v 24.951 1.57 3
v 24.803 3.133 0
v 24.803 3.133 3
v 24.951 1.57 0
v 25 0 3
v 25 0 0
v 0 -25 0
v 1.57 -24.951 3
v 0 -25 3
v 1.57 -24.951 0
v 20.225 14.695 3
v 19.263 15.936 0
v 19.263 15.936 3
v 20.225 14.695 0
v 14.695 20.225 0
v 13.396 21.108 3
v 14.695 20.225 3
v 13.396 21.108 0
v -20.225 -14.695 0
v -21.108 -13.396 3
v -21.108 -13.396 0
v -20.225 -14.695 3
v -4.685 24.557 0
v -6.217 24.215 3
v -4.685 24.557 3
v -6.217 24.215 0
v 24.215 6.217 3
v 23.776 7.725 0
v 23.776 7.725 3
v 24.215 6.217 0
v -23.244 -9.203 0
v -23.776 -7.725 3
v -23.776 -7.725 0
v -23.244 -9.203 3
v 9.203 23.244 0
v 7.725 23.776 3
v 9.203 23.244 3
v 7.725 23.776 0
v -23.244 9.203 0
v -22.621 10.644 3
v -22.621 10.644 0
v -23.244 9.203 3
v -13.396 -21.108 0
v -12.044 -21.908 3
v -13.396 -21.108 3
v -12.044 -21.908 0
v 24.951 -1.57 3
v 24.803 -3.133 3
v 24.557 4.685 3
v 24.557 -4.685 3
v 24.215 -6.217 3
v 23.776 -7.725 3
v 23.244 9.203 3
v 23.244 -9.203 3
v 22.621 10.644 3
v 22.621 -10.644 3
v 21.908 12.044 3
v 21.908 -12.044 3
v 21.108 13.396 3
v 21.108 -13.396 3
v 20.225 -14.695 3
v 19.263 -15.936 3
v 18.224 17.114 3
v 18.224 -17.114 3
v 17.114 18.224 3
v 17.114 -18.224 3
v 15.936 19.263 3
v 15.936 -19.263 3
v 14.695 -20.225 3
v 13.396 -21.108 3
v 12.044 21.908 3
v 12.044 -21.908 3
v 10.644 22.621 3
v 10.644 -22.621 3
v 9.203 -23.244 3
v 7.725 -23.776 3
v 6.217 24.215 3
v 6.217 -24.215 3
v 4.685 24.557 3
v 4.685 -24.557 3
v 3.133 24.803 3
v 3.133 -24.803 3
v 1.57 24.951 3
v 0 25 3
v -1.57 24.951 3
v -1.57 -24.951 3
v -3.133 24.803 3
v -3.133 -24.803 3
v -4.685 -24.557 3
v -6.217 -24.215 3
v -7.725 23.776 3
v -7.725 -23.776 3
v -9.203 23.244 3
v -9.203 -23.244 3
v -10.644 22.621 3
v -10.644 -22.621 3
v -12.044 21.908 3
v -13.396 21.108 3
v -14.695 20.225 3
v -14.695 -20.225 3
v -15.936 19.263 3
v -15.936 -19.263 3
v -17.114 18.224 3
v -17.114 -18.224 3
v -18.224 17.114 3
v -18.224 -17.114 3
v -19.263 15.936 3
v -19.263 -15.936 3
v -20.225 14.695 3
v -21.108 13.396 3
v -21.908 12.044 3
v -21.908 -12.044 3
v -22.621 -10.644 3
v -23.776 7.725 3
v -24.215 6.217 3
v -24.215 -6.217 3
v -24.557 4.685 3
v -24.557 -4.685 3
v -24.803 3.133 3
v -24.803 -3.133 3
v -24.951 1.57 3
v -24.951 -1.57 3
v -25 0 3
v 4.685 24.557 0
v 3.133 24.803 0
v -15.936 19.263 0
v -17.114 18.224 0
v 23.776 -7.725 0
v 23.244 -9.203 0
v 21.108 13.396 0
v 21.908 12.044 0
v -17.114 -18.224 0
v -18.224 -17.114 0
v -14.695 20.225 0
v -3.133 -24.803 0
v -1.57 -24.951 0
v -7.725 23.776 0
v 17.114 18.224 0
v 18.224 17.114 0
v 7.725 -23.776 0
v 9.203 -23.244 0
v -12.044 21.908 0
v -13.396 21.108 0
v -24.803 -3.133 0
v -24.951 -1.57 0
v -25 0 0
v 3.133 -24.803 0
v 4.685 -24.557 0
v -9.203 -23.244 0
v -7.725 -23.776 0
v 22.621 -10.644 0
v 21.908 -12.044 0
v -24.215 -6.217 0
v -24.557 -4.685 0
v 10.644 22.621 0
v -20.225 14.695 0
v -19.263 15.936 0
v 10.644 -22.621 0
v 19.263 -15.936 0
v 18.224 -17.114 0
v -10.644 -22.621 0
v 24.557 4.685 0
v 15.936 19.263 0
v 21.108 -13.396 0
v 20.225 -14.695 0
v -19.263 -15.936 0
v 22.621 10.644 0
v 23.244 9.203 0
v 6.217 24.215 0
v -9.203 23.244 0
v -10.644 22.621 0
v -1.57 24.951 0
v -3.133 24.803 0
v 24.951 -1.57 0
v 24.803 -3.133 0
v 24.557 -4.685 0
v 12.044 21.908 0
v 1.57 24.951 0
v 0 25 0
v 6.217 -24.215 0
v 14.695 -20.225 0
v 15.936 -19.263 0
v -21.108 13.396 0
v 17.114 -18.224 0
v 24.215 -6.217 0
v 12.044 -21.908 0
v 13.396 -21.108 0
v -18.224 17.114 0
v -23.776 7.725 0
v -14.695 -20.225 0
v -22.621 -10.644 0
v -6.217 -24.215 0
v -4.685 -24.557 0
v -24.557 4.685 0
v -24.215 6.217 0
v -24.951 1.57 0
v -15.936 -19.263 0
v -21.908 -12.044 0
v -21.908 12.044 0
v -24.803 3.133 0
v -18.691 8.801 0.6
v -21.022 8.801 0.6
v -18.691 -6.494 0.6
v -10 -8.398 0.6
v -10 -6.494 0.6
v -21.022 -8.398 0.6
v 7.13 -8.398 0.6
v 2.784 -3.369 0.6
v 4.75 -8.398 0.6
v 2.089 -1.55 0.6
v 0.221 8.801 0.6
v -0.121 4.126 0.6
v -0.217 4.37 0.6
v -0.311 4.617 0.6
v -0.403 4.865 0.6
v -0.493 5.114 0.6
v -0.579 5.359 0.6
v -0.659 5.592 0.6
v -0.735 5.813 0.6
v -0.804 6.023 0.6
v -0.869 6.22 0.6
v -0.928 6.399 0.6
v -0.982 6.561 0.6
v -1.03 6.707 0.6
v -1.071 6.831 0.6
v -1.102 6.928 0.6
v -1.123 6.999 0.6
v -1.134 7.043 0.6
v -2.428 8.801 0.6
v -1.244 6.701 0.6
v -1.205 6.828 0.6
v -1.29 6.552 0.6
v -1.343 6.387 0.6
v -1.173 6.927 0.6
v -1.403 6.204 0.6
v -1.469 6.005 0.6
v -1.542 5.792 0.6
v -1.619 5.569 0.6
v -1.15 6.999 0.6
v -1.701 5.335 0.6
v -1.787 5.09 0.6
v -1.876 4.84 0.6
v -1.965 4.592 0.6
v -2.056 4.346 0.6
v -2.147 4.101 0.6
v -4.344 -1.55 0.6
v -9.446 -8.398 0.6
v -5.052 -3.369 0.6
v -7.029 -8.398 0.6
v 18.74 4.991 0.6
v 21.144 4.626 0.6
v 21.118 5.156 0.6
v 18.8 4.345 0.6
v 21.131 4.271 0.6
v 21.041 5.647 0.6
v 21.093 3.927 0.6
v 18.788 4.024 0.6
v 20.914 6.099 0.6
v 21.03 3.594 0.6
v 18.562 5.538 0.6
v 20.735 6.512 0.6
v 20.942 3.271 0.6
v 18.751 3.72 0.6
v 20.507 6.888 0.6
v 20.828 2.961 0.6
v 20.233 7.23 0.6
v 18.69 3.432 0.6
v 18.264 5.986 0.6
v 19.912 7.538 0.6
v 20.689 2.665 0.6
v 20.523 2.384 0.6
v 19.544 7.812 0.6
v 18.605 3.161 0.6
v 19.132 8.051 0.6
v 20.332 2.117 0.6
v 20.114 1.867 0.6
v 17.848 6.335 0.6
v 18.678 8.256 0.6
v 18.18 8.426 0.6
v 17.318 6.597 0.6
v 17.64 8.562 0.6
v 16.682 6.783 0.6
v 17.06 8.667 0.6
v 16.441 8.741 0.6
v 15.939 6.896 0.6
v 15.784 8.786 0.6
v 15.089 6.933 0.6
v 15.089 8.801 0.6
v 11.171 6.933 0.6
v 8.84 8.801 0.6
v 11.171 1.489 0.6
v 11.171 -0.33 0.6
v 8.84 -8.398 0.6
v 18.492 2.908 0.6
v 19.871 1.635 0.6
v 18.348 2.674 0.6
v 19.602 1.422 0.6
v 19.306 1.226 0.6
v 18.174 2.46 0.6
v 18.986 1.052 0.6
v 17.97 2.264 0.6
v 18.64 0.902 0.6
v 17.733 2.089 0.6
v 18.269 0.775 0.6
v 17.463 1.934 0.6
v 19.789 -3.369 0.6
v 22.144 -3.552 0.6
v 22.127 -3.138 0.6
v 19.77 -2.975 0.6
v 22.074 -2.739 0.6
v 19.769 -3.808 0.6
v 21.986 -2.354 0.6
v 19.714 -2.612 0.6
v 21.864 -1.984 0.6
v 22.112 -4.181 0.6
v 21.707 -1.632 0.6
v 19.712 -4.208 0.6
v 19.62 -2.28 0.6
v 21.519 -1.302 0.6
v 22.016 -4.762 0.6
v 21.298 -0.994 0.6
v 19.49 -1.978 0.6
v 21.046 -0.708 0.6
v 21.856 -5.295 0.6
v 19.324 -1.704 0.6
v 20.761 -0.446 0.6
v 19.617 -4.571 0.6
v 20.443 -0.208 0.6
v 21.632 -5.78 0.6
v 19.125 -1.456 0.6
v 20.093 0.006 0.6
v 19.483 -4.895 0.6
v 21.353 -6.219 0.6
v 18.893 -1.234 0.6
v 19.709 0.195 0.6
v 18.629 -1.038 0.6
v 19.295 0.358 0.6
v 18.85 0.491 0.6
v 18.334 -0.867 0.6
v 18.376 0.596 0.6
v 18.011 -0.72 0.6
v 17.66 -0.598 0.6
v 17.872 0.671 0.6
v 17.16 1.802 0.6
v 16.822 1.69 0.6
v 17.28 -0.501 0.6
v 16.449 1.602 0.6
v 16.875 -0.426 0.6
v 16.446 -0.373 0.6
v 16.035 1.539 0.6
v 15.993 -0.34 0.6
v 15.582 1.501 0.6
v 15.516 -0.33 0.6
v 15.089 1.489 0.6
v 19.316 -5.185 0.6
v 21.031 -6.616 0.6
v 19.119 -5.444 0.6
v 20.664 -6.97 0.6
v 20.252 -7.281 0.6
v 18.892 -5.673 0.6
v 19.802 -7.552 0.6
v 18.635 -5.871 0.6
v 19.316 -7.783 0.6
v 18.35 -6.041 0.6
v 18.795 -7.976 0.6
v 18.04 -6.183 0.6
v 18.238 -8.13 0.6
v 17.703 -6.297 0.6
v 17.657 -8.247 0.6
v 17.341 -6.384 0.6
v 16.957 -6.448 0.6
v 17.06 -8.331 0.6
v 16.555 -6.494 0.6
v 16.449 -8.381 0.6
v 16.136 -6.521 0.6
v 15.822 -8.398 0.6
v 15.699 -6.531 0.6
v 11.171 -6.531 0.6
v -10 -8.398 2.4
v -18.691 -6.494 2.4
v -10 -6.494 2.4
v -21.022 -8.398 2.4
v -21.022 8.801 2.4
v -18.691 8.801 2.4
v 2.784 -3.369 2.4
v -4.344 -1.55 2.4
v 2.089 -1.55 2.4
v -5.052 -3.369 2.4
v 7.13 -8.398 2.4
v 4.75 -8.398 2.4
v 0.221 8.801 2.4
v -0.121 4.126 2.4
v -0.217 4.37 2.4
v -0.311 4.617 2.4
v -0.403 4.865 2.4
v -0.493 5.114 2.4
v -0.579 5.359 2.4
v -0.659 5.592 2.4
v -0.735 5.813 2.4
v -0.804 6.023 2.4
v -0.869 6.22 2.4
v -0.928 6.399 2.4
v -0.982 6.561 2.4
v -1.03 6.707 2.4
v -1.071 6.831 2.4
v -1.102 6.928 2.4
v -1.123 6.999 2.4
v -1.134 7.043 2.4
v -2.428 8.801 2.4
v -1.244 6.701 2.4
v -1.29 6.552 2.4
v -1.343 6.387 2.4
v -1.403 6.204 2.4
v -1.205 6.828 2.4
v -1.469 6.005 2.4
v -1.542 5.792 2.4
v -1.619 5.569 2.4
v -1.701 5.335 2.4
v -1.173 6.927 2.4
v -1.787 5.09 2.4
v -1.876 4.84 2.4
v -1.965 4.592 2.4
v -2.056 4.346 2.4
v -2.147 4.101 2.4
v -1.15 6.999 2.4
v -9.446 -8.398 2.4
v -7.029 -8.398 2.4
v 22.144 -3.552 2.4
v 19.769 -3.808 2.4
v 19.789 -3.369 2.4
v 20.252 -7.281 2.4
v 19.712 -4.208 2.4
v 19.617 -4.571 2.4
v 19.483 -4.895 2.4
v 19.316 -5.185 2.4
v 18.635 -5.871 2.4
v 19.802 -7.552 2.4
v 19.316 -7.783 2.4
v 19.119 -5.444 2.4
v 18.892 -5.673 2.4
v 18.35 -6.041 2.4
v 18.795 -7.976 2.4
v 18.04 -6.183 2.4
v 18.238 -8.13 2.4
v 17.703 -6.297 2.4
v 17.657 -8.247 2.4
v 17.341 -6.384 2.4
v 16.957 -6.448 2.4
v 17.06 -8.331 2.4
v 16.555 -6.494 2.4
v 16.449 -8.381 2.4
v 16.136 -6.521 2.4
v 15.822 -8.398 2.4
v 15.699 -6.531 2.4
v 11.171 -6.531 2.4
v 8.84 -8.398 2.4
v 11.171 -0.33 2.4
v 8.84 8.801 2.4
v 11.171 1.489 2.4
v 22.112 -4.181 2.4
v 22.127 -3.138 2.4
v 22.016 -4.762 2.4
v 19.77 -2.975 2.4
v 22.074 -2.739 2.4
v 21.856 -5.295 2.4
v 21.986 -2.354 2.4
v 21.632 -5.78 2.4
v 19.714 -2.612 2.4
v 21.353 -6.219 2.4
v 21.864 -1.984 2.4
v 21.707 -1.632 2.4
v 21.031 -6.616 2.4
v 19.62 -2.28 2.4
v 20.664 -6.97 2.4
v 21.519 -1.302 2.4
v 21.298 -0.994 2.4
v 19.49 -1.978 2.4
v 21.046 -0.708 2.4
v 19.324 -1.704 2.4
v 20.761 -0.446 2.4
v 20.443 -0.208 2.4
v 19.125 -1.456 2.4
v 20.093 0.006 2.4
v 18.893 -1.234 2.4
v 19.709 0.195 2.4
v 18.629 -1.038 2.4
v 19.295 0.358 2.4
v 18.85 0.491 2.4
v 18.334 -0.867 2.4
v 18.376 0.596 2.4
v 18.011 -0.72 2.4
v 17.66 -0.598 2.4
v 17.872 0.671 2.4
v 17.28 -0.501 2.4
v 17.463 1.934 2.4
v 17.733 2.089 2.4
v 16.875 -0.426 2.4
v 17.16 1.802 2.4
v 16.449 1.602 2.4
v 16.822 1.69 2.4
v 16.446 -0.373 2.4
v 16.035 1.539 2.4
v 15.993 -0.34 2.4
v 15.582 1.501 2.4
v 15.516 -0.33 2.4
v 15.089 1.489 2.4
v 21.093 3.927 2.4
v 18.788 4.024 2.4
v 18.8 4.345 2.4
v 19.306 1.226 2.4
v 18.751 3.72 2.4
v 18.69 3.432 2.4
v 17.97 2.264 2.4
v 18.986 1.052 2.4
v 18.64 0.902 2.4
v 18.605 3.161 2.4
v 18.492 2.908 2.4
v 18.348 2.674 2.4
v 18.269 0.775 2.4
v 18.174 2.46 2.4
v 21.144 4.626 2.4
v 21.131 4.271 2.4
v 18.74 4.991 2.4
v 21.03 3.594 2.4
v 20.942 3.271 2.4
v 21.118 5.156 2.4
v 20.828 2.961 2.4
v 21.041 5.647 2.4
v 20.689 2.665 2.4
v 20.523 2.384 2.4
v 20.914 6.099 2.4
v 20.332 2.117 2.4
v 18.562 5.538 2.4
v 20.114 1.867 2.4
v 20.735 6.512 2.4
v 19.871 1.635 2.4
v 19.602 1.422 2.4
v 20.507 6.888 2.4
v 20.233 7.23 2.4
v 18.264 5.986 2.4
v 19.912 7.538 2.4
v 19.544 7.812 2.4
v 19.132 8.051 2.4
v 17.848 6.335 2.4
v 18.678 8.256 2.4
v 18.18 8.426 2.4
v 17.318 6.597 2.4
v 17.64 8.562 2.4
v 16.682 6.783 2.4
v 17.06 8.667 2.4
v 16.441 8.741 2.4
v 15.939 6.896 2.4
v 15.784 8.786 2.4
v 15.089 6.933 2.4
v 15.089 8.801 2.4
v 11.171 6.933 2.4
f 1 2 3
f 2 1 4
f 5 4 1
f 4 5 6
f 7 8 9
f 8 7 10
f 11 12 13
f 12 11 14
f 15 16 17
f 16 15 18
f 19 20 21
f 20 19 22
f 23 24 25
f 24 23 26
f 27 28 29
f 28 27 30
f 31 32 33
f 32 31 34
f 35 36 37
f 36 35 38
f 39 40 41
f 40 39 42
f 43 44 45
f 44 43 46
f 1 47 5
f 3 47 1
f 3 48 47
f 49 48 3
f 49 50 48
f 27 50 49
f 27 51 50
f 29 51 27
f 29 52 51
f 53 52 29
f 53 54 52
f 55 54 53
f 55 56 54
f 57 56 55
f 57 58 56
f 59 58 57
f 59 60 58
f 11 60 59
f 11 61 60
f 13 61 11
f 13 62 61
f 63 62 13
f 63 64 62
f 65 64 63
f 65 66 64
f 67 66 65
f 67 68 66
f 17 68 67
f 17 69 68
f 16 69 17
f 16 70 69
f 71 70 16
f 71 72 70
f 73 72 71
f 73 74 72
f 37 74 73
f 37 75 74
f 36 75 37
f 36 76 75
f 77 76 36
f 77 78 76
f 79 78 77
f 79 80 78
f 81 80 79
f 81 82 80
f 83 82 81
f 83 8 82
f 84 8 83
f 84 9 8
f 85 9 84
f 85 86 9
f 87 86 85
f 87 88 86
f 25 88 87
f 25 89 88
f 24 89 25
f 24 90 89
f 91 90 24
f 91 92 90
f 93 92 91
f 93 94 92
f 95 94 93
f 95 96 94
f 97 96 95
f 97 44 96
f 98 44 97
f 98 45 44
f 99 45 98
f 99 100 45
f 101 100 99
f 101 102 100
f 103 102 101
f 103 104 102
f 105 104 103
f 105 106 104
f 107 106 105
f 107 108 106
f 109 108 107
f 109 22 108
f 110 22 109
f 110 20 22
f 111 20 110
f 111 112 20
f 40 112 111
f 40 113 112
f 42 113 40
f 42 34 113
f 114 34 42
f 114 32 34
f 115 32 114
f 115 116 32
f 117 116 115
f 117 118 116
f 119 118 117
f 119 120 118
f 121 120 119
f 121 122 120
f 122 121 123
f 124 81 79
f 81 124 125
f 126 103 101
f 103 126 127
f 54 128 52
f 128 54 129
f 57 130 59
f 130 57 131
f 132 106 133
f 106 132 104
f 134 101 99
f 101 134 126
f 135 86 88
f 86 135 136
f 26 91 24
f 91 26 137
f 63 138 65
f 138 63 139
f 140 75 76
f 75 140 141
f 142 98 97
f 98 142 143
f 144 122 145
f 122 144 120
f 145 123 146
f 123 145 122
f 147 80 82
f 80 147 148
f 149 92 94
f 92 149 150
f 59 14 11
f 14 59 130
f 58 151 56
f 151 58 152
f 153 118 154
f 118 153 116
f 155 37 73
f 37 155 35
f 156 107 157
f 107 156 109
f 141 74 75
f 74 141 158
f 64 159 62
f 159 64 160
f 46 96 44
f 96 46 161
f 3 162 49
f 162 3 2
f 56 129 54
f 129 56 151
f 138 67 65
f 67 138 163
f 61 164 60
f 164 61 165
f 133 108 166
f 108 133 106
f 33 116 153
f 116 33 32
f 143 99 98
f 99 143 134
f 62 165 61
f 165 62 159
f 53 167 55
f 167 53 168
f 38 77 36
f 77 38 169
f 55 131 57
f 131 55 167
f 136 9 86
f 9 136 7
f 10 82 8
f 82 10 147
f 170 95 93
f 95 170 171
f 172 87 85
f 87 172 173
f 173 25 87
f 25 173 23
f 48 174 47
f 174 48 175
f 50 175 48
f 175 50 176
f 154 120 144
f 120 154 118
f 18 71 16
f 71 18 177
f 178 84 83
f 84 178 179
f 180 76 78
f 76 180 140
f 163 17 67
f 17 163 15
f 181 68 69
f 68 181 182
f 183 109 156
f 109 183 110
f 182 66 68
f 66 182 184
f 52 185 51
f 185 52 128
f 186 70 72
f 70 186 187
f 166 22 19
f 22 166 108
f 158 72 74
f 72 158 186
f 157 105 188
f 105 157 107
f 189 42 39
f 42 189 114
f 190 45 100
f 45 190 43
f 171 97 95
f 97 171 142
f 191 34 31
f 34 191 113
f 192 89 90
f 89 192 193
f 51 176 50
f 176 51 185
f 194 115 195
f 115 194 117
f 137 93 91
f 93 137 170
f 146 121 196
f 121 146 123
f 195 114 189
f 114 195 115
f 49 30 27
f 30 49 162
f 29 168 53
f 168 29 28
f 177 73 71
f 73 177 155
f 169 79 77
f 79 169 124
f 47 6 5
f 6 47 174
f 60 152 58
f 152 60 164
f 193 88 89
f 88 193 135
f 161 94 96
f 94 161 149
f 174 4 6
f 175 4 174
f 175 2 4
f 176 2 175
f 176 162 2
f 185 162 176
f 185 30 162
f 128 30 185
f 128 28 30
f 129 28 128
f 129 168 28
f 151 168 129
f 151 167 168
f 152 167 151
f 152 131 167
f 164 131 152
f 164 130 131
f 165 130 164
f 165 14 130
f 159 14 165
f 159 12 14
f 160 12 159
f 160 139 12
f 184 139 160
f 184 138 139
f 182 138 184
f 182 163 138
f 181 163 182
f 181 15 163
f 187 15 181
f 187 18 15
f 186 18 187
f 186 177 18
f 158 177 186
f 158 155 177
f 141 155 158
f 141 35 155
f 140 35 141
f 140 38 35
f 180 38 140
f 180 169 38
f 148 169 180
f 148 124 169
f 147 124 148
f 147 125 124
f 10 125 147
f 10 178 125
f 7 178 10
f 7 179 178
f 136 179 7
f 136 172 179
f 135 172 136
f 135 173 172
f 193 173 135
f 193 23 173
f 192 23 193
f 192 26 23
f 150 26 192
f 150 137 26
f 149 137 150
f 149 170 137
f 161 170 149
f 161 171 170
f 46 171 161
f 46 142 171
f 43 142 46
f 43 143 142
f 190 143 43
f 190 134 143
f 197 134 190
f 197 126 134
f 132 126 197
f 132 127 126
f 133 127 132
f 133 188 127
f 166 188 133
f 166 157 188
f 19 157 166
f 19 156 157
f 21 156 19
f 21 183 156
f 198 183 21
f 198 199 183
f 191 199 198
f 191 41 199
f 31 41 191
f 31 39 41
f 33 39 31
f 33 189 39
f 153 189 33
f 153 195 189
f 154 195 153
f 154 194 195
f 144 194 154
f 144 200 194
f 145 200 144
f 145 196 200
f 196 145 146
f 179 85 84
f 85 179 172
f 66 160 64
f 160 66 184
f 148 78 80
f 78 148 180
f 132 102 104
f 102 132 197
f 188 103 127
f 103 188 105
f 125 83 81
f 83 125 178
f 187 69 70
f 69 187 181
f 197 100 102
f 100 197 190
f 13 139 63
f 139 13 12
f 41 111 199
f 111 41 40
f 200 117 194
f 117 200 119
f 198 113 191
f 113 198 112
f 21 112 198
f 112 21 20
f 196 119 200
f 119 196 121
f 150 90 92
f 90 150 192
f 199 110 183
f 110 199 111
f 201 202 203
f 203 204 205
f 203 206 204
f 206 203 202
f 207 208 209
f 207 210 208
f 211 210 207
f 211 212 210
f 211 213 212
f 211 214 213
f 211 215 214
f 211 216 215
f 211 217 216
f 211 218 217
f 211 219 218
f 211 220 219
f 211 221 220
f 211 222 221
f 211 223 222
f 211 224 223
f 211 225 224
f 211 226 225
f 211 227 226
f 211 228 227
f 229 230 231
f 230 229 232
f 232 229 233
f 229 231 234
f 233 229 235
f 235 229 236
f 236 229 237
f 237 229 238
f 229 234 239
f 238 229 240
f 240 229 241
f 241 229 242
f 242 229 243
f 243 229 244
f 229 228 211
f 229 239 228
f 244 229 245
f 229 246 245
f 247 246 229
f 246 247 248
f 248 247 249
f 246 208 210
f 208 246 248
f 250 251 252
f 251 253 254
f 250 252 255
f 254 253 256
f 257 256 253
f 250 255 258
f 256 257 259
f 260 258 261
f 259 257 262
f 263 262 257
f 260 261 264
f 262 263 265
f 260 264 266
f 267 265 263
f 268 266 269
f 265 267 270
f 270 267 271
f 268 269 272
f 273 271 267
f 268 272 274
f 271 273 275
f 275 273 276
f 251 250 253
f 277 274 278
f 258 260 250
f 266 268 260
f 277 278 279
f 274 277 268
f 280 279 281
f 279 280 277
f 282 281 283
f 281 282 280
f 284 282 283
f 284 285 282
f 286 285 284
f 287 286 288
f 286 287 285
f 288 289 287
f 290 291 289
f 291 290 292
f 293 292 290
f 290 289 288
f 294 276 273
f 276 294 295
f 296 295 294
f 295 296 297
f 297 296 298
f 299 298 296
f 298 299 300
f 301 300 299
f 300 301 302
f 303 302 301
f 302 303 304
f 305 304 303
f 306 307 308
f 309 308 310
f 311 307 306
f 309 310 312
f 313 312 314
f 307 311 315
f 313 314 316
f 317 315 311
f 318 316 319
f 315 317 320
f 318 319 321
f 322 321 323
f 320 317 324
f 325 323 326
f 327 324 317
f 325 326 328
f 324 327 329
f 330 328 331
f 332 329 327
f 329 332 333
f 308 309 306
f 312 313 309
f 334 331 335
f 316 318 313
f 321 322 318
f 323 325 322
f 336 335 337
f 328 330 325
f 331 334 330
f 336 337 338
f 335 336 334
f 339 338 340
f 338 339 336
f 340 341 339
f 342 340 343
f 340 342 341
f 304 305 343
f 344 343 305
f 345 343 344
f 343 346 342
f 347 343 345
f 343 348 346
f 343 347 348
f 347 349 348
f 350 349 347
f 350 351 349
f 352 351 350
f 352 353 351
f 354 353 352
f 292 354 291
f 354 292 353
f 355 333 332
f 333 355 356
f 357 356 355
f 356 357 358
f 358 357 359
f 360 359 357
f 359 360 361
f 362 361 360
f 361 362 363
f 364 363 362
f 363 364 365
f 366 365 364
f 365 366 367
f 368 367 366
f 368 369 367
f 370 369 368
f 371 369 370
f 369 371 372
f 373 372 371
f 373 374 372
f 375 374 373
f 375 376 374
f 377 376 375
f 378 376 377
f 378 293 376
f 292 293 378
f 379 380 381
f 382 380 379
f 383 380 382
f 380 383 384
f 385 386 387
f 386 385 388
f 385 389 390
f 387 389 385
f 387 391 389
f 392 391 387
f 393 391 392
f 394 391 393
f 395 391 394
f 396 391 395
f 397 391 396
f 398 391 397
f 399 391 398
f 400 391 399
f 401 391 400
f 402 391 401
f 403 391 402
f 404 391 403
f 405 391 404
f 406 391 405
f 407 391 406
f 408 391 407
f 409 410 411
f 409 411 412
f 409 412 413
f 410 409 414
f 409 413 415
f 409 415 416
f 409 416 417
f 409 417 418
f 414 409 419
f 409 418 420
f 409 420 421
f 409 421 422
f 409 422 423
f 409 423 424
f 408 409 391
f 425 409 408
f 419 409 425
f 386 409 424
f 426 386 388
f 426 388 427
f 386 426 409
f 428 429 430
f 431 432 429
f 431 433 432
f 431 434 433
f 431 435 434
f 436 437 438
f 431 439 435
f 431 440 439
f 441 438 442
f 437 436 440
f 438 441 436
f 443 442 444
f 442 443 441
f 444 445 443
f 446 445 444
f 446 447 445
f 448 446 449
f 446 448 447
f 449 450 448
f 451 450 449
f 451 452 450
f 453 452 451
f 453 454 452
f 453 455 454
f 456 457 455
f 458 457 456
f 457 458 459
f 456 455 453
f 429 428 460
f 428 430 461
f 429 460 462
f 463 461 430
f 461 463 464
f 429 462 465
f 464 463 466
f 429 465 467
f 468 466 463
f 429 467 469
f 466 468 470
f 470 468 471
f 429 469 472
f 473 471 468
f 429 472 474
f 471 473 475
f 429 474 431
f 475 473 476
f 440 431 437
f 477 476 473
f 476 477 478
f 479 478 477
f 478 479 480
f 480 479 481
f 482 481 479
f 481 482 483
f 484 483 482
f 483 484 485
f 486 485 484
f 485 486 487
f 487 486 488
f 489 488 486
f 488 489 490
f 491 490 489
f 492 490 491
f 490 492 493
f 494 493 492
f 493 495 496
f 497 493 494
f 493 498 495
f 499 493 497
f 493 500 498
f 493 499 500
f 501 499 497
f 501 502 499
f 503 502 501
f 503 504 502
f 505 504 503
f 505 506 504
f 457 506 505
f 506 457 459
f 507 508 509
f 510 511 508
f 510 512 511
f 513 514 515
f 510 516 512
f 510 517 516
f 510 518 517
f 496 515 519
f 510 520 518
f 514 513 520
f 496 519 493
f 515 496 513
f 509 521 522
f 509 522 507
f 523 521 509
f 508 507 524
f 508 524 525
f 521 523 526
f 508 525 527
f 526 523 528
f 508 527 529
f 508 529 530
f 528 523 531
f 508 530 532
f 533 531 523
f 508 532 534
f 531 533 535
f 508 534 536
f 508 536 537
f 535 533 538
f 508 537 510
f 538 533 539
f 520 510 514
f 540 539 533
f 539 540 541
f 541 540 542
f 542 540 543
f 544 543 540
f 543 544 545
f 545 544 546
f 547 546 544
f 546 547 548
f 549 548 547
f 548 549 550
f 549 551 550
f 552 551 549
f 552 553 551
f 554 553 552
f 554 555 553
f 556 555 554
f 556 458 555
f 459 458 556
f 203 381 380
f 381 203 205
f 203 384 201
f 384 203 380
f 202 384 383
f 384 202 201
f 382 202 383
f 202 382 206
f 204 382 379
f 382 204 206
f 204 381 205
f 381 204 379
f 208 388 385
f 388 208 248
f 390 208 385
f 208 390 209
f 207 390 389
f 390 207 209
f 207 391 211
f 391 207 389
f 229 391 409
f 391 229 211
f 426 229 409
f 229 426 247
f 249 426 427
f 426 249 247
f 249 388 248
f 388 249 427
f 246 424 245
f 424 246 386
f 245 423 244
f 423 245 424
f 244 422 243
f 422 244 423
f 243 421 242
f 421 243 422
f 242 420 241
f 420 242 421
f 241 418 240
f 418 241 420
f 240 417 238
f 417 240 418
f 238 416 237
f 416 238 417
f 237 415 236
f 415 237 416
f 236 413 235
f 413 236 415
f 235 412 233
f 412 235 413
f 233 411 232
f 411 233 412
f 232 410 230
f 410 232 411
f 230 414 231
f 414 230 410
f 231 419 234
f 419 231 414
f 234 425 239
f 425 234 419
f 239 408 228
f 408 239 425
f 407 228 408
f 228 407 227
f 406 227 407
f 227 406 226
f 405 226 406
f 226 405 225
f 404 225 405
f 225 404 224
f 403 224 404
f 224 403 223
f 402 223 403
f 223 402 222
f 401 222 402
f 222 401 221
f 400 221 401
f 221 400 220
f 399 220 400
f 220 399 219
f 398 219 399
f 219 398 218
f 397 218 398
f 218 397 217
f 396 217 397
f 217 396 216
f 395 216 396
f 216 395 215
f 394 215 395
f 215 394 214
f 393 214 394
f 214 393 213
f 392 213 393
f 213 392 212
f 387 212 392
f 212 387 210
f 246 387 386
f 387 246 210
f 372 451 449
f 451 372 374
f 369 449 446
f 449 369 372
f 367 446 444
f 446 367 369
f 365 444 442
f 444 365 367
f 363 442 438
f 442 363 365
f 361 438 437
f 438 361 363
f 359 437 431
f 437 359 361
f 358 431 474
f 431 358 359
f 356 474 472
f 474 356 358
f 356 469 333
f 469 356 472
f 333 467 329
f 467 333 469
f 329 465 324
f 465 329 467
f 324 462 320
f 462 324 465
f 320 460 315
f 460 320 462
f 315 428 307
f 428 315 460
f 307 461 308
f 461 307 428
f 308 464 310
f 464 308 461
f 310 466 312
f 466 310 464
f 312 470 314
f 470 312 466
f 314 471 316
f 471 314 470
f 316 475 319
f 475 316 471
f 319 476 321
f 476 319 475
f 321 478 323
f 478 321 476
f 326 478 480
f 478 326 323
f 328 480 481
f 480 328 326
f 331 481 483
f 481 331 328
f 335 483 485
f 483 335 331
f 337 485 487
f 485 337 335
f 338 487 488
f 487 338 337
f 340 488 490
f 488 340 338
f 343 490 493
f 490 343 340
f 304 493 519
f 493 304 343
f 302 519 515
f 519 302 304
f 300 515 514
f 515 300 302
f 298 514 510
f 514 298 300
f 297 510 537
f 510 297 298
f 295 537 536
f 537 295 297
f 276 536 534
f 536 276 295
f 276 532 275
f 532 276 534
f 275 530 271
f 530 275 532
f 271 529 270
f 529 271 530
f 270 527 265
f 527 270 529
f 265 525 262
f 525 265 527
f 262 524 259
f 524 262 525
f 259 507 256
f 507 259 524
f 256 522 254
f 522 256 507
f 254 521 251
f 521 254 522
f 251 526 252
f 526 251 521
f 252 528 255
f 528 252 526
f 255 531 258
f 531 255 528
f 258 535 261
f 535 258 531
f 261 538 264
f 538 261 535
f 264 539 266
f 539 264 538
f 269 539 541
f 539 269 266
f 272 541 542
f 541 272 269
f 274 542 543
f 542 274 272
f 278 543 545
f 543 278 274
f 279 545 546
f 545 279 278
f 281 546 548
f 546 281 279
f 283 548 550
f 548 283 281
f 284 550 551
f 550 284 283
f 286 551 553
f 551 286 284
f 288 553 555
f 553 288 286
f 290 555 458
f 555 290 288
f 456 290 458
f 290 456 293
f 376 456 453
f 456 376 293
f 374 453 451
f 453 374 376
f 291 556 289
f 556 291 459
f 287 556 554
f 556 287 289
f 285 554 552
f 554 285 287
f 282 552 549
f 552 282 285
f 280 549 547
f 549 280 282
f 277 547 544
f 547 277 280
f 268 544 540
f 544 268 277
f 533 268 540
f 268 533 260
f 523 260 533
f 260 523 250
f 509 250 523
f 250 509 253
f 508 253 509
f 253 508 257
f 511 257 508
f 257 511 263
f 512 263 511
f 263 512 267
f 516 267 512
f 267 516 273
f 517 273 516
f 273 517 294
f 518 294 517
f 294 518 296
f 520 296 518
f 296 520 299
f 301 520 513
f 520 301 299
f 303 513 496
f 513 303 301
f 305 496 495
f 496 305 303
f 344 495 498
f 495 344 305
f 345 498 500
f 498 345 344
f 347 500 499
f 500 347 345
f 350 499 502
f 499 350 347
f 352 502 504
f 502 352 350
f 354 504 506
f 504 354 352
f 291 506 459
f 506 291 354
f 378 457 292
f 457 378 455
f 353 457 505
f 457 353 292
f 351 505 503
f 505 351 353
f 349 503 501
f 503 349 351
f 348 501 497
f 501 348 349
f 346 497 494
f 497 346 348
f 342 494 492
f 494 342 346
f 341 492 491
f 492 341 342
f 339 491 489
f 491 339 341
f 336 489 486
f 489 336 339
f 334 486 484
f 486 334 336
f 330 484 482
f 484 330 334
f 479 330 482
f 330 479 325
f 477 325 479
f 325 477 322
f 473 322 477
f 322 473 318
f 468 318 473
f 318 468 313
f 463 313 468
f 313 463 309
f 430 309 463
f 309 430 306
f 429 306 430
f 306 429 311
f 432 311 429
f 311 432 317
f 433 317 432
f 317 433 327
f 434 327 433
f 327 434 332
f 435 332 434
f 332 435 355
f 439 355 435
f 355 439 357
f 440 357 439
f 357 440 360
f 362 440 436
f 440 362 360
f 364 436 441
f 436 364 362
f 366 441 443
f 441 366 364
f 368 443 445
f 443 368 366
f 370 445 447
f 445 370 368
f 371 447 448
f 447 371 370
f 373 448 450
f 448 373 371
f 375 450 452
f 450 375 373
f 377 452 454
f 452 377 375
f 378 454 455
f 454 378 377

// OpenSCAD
/* Two-color token with recessed inlay (export as a single STL and use M600 at layer/height) */
difference(){
  cylinder(h=3, r=25, $fn=100);
  translate([0,0,0.6]) linear_extrude(1.8) text("LAB", size=18, halign="center", valign="center");
}
